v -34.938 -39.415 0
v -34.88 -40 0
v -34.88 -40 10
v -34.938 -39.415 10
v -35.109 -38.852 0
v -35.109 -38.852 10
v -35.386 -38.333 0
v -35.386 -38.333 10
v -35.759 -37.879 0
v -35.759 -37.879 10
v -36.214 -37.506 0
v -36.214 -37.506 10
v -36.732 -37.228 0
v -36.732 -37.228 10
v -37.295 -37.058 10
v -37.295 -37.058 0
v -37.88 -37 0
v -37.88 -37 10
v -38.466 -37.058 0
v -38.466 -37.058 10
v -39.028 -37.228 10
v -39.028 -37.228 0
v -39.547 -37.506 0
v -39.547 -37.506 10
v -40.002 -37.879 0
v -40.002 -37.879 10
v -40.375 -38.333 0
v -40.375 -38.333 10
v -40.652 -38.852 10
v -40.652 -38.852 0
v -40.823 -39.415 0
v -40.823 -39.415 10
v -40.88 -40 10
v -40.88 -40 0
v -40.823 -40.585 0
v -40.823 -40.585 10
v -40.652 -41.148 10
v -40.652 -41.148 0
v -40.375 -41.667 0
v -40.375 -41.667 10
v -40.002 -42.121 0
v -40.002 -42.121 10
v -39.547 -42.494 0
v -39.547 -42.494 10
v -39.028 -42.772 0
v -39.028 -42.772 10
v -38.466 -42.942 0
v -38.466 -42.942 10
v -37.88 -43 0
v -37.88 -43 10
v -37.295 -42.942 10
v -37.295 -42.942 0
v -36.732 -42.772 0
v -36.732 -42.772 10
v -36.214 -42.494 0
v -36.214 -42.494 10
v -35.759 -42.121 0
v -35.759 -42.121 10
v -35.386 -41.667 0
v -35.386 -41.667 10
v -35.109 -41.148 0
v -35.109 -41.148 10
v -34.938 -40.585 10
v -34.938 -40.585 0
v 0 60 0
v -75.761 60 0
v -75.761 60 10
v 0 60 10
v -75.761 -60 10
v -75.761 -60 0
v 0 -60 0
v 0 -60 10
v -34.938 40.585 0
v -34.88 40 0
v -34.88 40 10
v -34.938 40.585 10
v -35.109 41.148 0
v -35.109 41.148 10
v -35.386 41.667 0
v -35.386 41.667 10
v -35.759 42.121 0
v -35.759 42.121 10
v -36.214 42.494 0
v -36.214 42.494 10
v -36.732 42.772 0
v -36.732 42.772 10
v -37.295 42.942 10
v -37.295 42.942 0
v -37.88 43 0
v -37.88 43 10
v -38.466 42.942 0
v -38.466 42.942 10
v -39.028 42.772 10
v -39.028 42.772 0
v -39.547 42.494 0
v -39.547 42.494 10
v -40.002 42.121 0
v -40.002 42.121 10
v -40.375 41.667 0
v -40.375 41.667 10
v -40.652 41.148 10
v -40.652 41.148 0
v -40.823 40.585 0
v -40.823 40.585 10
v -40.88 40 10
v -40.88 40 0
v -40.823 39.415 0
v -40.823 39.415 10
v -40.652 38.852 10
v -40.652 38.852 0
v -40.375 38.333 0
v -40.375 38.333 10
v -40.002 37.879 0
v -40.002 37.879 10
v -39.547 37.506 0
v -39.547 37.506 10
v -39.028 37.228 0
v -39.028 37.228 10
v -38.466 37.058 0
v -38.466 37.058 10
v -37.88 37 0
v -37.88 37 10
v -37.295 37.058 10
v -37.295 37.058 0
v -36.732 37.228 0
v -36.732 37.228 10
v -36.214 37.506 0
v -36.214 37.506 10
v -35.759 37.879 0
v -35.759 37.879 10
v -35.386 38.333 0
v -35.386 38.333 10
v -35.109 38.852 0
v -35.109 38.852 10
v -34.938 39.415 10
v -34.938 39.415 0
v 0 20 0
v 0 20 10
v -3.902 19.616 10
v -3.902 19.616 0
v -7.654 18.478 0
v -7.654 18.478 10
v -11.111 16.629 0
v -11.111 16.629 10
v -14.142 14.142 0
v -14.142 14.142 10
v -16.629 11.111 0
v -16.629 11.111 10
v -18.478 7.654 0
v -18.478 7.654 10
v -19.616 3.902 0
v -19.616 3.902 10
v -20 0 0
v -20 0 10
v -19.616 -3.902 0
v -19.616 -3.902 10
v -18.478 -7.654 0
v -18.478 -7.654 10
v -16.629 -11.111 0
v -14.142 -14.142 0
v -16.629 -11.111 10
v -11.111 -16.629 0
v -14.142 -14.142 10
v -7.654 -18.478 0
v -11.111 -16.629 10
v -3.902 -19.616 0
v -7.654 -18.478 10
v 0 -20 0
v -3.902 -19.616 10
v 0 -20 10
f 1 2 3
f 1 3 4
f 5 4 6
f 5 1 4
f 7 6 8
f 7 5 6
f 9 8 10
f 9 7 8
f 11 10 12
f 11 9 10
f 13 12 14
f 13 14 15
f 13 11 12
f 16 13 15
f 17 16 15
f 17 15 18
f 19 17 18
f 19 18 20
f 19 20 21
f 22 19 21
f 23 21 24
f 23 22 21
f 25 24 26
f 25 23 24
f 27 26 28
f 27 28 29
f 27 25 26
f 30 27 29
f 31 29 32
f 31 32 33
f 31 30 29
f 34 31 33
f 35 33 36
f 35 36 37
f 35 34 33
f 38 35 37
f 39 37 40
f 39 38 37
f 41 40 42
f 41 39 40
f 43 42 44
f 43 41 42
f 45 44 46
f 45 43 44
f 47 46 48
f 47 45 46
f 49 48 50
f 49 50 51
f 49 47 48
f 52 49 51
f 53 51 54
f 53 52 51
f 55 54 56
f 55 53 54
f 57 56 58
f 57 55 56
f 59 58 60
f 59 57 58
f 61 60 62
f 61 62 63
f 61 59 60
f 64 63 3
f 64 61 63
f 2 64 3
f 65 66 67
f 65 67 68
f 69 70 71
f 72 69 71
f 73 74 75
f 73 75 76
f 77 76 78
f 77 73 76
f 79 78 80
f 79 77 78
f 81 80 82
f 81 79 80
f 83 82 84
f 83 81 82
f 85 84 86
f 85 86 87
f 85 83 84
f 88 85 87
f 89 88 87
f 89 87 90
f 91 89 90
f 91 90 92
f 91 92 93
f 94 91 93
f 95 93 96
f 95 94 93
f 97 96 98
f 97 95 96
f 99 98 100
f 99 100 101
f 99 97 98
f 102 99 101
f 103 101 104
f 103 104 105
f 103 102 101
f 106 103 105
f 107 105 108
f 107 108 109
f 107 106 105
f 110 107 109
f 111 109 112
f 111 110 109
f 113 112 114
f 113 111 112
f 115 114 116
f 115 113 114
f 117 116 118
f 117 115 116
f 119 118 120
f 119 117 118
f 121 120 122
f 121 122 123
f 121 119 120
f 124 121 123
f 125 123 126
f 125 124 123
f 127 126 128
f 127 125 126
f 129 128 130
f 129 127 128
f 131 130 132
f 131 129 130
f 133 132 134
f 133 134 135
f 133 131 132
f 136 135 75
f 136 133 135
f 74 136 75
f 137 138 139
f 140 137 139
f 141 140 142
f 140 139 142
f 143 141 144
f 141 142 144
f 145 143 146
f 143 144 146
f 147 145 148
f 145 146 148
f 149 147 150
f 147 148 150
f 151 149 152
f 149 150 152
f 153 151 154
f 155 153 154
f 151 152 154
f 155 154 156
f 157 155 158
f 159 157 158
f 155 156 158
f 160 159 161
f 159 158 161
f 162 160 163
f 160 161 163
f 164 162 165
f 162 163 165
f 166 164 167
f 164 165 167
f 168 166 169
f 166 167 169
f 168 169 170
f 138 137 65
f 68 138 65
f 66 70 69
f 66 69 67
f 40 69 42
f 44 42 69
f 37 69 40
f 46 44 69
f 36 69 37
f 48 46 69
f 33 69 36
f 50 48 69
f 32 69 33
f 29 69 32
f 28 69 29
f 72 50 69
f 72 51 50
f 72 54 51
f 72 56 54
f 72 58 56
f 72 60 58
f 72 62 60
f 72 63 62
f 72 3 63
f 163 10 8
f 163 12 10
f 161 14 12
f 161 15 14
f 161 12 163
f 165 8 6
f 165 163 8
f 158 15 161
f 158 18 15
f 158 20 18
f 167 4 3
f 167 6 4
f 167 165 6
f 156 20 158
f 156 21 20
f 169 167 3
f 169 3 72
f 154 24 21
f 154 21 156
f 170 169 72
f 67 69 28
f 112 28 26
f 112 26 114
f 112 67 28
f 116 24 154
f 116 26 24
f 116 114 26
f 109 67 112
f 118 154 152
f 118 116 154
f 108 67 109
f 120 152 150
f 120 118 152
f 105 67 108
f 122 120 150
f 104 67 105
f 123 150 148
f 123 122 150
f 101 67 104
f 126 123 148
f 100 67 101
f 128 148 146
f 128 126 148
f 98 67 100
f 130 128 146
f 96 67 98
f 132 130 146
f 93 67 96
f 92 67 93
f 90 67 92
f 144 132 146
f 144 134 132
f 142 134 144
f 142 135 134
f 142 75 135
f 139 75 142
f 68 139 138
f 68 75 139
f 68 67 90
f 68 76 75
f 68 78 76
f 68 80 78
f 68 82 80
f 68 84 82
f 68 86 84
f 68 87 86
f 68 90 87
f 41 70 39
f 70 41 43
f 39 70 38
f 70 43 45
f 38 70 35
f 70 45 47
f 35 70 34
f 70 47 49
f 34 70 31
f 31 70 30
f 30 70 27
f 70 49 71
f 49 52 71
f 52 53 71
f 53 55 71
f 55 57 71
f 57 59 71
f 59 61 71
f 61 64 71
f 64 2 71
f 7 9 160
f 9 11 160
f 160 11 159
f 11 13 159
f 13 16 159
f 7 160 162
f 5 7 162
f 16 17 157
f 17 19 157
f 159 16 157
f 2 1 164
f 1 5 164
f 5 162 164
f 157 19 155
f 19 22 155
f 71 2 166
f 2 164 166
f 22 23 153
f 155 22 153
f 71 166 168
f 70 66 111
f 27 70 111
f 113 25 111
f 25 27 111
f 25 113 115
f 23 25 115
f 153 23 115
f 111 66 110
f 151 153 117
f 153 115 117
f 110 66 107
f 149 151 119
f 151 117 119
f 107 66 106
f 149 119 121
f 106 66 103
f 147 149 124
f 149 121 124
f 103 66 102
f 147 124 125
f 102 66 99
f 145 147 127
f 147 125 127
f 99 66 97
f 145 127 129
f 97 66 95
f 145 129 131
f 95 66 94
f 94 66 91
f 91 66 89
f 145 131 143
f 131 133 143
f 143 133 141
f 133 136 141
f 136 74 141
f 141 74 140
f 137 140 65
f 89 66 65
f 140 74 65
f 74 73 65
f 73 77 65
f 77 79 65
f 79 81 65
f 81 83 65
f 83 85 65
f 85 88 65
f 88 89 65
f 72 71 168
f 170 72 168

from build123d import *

# Parameters (mm, degrees)
SKETCH_1_W          = 75.760831706
SKETCH_1_H          = 120
SKETCH_1_R          = 3
EXTRUDE_1_DEPTH     = 10
SKETCH_5_R          = 20
CUT_EXTRUDE_1_DEPTH = 20


with BuildPart() as part:
    # 草图1 → 凸台-拉伸1 (new body)
    # profile 1 of 2: a face of its own
    with BuildSketch(Plane.XY):
        with BuildLine():
            Line((0, -37.880415853), (0, 37.880415853))
            ThreePointArc((0, 37.880415853), (-37.880415853, 0), (0, -37.880415853))
        make_face()
    # profile 2 of 2: a face of its own
    with BuildSketch(Plane.XY):
        with Locations((-37.880415853, 0)):
            Rectangle(SKETCH_1_W, SKETCH_1_H)
        with Locations((-37.880415853, -40)):
            Circle(SKETCH_1_R, mode=Mode.SUBTRACT)
        with Locations((-37.880415853, 40)):
            Circle(SKETCH_1_R, mode=Mode.SUBTRACT)
    extrude(amount=EXTRUDE_1_DEPTH)

    # 草图5 → 切除-拉伸1 (cut)
    with BuildSketch(Plane.XY.offset(10)):
        Circle(SKETCH_5_R)
    extrude(amount=-CUT_EXTRUDE_1_DEPTH, mode=Mode.SUBTRACT)


solid = part.part
